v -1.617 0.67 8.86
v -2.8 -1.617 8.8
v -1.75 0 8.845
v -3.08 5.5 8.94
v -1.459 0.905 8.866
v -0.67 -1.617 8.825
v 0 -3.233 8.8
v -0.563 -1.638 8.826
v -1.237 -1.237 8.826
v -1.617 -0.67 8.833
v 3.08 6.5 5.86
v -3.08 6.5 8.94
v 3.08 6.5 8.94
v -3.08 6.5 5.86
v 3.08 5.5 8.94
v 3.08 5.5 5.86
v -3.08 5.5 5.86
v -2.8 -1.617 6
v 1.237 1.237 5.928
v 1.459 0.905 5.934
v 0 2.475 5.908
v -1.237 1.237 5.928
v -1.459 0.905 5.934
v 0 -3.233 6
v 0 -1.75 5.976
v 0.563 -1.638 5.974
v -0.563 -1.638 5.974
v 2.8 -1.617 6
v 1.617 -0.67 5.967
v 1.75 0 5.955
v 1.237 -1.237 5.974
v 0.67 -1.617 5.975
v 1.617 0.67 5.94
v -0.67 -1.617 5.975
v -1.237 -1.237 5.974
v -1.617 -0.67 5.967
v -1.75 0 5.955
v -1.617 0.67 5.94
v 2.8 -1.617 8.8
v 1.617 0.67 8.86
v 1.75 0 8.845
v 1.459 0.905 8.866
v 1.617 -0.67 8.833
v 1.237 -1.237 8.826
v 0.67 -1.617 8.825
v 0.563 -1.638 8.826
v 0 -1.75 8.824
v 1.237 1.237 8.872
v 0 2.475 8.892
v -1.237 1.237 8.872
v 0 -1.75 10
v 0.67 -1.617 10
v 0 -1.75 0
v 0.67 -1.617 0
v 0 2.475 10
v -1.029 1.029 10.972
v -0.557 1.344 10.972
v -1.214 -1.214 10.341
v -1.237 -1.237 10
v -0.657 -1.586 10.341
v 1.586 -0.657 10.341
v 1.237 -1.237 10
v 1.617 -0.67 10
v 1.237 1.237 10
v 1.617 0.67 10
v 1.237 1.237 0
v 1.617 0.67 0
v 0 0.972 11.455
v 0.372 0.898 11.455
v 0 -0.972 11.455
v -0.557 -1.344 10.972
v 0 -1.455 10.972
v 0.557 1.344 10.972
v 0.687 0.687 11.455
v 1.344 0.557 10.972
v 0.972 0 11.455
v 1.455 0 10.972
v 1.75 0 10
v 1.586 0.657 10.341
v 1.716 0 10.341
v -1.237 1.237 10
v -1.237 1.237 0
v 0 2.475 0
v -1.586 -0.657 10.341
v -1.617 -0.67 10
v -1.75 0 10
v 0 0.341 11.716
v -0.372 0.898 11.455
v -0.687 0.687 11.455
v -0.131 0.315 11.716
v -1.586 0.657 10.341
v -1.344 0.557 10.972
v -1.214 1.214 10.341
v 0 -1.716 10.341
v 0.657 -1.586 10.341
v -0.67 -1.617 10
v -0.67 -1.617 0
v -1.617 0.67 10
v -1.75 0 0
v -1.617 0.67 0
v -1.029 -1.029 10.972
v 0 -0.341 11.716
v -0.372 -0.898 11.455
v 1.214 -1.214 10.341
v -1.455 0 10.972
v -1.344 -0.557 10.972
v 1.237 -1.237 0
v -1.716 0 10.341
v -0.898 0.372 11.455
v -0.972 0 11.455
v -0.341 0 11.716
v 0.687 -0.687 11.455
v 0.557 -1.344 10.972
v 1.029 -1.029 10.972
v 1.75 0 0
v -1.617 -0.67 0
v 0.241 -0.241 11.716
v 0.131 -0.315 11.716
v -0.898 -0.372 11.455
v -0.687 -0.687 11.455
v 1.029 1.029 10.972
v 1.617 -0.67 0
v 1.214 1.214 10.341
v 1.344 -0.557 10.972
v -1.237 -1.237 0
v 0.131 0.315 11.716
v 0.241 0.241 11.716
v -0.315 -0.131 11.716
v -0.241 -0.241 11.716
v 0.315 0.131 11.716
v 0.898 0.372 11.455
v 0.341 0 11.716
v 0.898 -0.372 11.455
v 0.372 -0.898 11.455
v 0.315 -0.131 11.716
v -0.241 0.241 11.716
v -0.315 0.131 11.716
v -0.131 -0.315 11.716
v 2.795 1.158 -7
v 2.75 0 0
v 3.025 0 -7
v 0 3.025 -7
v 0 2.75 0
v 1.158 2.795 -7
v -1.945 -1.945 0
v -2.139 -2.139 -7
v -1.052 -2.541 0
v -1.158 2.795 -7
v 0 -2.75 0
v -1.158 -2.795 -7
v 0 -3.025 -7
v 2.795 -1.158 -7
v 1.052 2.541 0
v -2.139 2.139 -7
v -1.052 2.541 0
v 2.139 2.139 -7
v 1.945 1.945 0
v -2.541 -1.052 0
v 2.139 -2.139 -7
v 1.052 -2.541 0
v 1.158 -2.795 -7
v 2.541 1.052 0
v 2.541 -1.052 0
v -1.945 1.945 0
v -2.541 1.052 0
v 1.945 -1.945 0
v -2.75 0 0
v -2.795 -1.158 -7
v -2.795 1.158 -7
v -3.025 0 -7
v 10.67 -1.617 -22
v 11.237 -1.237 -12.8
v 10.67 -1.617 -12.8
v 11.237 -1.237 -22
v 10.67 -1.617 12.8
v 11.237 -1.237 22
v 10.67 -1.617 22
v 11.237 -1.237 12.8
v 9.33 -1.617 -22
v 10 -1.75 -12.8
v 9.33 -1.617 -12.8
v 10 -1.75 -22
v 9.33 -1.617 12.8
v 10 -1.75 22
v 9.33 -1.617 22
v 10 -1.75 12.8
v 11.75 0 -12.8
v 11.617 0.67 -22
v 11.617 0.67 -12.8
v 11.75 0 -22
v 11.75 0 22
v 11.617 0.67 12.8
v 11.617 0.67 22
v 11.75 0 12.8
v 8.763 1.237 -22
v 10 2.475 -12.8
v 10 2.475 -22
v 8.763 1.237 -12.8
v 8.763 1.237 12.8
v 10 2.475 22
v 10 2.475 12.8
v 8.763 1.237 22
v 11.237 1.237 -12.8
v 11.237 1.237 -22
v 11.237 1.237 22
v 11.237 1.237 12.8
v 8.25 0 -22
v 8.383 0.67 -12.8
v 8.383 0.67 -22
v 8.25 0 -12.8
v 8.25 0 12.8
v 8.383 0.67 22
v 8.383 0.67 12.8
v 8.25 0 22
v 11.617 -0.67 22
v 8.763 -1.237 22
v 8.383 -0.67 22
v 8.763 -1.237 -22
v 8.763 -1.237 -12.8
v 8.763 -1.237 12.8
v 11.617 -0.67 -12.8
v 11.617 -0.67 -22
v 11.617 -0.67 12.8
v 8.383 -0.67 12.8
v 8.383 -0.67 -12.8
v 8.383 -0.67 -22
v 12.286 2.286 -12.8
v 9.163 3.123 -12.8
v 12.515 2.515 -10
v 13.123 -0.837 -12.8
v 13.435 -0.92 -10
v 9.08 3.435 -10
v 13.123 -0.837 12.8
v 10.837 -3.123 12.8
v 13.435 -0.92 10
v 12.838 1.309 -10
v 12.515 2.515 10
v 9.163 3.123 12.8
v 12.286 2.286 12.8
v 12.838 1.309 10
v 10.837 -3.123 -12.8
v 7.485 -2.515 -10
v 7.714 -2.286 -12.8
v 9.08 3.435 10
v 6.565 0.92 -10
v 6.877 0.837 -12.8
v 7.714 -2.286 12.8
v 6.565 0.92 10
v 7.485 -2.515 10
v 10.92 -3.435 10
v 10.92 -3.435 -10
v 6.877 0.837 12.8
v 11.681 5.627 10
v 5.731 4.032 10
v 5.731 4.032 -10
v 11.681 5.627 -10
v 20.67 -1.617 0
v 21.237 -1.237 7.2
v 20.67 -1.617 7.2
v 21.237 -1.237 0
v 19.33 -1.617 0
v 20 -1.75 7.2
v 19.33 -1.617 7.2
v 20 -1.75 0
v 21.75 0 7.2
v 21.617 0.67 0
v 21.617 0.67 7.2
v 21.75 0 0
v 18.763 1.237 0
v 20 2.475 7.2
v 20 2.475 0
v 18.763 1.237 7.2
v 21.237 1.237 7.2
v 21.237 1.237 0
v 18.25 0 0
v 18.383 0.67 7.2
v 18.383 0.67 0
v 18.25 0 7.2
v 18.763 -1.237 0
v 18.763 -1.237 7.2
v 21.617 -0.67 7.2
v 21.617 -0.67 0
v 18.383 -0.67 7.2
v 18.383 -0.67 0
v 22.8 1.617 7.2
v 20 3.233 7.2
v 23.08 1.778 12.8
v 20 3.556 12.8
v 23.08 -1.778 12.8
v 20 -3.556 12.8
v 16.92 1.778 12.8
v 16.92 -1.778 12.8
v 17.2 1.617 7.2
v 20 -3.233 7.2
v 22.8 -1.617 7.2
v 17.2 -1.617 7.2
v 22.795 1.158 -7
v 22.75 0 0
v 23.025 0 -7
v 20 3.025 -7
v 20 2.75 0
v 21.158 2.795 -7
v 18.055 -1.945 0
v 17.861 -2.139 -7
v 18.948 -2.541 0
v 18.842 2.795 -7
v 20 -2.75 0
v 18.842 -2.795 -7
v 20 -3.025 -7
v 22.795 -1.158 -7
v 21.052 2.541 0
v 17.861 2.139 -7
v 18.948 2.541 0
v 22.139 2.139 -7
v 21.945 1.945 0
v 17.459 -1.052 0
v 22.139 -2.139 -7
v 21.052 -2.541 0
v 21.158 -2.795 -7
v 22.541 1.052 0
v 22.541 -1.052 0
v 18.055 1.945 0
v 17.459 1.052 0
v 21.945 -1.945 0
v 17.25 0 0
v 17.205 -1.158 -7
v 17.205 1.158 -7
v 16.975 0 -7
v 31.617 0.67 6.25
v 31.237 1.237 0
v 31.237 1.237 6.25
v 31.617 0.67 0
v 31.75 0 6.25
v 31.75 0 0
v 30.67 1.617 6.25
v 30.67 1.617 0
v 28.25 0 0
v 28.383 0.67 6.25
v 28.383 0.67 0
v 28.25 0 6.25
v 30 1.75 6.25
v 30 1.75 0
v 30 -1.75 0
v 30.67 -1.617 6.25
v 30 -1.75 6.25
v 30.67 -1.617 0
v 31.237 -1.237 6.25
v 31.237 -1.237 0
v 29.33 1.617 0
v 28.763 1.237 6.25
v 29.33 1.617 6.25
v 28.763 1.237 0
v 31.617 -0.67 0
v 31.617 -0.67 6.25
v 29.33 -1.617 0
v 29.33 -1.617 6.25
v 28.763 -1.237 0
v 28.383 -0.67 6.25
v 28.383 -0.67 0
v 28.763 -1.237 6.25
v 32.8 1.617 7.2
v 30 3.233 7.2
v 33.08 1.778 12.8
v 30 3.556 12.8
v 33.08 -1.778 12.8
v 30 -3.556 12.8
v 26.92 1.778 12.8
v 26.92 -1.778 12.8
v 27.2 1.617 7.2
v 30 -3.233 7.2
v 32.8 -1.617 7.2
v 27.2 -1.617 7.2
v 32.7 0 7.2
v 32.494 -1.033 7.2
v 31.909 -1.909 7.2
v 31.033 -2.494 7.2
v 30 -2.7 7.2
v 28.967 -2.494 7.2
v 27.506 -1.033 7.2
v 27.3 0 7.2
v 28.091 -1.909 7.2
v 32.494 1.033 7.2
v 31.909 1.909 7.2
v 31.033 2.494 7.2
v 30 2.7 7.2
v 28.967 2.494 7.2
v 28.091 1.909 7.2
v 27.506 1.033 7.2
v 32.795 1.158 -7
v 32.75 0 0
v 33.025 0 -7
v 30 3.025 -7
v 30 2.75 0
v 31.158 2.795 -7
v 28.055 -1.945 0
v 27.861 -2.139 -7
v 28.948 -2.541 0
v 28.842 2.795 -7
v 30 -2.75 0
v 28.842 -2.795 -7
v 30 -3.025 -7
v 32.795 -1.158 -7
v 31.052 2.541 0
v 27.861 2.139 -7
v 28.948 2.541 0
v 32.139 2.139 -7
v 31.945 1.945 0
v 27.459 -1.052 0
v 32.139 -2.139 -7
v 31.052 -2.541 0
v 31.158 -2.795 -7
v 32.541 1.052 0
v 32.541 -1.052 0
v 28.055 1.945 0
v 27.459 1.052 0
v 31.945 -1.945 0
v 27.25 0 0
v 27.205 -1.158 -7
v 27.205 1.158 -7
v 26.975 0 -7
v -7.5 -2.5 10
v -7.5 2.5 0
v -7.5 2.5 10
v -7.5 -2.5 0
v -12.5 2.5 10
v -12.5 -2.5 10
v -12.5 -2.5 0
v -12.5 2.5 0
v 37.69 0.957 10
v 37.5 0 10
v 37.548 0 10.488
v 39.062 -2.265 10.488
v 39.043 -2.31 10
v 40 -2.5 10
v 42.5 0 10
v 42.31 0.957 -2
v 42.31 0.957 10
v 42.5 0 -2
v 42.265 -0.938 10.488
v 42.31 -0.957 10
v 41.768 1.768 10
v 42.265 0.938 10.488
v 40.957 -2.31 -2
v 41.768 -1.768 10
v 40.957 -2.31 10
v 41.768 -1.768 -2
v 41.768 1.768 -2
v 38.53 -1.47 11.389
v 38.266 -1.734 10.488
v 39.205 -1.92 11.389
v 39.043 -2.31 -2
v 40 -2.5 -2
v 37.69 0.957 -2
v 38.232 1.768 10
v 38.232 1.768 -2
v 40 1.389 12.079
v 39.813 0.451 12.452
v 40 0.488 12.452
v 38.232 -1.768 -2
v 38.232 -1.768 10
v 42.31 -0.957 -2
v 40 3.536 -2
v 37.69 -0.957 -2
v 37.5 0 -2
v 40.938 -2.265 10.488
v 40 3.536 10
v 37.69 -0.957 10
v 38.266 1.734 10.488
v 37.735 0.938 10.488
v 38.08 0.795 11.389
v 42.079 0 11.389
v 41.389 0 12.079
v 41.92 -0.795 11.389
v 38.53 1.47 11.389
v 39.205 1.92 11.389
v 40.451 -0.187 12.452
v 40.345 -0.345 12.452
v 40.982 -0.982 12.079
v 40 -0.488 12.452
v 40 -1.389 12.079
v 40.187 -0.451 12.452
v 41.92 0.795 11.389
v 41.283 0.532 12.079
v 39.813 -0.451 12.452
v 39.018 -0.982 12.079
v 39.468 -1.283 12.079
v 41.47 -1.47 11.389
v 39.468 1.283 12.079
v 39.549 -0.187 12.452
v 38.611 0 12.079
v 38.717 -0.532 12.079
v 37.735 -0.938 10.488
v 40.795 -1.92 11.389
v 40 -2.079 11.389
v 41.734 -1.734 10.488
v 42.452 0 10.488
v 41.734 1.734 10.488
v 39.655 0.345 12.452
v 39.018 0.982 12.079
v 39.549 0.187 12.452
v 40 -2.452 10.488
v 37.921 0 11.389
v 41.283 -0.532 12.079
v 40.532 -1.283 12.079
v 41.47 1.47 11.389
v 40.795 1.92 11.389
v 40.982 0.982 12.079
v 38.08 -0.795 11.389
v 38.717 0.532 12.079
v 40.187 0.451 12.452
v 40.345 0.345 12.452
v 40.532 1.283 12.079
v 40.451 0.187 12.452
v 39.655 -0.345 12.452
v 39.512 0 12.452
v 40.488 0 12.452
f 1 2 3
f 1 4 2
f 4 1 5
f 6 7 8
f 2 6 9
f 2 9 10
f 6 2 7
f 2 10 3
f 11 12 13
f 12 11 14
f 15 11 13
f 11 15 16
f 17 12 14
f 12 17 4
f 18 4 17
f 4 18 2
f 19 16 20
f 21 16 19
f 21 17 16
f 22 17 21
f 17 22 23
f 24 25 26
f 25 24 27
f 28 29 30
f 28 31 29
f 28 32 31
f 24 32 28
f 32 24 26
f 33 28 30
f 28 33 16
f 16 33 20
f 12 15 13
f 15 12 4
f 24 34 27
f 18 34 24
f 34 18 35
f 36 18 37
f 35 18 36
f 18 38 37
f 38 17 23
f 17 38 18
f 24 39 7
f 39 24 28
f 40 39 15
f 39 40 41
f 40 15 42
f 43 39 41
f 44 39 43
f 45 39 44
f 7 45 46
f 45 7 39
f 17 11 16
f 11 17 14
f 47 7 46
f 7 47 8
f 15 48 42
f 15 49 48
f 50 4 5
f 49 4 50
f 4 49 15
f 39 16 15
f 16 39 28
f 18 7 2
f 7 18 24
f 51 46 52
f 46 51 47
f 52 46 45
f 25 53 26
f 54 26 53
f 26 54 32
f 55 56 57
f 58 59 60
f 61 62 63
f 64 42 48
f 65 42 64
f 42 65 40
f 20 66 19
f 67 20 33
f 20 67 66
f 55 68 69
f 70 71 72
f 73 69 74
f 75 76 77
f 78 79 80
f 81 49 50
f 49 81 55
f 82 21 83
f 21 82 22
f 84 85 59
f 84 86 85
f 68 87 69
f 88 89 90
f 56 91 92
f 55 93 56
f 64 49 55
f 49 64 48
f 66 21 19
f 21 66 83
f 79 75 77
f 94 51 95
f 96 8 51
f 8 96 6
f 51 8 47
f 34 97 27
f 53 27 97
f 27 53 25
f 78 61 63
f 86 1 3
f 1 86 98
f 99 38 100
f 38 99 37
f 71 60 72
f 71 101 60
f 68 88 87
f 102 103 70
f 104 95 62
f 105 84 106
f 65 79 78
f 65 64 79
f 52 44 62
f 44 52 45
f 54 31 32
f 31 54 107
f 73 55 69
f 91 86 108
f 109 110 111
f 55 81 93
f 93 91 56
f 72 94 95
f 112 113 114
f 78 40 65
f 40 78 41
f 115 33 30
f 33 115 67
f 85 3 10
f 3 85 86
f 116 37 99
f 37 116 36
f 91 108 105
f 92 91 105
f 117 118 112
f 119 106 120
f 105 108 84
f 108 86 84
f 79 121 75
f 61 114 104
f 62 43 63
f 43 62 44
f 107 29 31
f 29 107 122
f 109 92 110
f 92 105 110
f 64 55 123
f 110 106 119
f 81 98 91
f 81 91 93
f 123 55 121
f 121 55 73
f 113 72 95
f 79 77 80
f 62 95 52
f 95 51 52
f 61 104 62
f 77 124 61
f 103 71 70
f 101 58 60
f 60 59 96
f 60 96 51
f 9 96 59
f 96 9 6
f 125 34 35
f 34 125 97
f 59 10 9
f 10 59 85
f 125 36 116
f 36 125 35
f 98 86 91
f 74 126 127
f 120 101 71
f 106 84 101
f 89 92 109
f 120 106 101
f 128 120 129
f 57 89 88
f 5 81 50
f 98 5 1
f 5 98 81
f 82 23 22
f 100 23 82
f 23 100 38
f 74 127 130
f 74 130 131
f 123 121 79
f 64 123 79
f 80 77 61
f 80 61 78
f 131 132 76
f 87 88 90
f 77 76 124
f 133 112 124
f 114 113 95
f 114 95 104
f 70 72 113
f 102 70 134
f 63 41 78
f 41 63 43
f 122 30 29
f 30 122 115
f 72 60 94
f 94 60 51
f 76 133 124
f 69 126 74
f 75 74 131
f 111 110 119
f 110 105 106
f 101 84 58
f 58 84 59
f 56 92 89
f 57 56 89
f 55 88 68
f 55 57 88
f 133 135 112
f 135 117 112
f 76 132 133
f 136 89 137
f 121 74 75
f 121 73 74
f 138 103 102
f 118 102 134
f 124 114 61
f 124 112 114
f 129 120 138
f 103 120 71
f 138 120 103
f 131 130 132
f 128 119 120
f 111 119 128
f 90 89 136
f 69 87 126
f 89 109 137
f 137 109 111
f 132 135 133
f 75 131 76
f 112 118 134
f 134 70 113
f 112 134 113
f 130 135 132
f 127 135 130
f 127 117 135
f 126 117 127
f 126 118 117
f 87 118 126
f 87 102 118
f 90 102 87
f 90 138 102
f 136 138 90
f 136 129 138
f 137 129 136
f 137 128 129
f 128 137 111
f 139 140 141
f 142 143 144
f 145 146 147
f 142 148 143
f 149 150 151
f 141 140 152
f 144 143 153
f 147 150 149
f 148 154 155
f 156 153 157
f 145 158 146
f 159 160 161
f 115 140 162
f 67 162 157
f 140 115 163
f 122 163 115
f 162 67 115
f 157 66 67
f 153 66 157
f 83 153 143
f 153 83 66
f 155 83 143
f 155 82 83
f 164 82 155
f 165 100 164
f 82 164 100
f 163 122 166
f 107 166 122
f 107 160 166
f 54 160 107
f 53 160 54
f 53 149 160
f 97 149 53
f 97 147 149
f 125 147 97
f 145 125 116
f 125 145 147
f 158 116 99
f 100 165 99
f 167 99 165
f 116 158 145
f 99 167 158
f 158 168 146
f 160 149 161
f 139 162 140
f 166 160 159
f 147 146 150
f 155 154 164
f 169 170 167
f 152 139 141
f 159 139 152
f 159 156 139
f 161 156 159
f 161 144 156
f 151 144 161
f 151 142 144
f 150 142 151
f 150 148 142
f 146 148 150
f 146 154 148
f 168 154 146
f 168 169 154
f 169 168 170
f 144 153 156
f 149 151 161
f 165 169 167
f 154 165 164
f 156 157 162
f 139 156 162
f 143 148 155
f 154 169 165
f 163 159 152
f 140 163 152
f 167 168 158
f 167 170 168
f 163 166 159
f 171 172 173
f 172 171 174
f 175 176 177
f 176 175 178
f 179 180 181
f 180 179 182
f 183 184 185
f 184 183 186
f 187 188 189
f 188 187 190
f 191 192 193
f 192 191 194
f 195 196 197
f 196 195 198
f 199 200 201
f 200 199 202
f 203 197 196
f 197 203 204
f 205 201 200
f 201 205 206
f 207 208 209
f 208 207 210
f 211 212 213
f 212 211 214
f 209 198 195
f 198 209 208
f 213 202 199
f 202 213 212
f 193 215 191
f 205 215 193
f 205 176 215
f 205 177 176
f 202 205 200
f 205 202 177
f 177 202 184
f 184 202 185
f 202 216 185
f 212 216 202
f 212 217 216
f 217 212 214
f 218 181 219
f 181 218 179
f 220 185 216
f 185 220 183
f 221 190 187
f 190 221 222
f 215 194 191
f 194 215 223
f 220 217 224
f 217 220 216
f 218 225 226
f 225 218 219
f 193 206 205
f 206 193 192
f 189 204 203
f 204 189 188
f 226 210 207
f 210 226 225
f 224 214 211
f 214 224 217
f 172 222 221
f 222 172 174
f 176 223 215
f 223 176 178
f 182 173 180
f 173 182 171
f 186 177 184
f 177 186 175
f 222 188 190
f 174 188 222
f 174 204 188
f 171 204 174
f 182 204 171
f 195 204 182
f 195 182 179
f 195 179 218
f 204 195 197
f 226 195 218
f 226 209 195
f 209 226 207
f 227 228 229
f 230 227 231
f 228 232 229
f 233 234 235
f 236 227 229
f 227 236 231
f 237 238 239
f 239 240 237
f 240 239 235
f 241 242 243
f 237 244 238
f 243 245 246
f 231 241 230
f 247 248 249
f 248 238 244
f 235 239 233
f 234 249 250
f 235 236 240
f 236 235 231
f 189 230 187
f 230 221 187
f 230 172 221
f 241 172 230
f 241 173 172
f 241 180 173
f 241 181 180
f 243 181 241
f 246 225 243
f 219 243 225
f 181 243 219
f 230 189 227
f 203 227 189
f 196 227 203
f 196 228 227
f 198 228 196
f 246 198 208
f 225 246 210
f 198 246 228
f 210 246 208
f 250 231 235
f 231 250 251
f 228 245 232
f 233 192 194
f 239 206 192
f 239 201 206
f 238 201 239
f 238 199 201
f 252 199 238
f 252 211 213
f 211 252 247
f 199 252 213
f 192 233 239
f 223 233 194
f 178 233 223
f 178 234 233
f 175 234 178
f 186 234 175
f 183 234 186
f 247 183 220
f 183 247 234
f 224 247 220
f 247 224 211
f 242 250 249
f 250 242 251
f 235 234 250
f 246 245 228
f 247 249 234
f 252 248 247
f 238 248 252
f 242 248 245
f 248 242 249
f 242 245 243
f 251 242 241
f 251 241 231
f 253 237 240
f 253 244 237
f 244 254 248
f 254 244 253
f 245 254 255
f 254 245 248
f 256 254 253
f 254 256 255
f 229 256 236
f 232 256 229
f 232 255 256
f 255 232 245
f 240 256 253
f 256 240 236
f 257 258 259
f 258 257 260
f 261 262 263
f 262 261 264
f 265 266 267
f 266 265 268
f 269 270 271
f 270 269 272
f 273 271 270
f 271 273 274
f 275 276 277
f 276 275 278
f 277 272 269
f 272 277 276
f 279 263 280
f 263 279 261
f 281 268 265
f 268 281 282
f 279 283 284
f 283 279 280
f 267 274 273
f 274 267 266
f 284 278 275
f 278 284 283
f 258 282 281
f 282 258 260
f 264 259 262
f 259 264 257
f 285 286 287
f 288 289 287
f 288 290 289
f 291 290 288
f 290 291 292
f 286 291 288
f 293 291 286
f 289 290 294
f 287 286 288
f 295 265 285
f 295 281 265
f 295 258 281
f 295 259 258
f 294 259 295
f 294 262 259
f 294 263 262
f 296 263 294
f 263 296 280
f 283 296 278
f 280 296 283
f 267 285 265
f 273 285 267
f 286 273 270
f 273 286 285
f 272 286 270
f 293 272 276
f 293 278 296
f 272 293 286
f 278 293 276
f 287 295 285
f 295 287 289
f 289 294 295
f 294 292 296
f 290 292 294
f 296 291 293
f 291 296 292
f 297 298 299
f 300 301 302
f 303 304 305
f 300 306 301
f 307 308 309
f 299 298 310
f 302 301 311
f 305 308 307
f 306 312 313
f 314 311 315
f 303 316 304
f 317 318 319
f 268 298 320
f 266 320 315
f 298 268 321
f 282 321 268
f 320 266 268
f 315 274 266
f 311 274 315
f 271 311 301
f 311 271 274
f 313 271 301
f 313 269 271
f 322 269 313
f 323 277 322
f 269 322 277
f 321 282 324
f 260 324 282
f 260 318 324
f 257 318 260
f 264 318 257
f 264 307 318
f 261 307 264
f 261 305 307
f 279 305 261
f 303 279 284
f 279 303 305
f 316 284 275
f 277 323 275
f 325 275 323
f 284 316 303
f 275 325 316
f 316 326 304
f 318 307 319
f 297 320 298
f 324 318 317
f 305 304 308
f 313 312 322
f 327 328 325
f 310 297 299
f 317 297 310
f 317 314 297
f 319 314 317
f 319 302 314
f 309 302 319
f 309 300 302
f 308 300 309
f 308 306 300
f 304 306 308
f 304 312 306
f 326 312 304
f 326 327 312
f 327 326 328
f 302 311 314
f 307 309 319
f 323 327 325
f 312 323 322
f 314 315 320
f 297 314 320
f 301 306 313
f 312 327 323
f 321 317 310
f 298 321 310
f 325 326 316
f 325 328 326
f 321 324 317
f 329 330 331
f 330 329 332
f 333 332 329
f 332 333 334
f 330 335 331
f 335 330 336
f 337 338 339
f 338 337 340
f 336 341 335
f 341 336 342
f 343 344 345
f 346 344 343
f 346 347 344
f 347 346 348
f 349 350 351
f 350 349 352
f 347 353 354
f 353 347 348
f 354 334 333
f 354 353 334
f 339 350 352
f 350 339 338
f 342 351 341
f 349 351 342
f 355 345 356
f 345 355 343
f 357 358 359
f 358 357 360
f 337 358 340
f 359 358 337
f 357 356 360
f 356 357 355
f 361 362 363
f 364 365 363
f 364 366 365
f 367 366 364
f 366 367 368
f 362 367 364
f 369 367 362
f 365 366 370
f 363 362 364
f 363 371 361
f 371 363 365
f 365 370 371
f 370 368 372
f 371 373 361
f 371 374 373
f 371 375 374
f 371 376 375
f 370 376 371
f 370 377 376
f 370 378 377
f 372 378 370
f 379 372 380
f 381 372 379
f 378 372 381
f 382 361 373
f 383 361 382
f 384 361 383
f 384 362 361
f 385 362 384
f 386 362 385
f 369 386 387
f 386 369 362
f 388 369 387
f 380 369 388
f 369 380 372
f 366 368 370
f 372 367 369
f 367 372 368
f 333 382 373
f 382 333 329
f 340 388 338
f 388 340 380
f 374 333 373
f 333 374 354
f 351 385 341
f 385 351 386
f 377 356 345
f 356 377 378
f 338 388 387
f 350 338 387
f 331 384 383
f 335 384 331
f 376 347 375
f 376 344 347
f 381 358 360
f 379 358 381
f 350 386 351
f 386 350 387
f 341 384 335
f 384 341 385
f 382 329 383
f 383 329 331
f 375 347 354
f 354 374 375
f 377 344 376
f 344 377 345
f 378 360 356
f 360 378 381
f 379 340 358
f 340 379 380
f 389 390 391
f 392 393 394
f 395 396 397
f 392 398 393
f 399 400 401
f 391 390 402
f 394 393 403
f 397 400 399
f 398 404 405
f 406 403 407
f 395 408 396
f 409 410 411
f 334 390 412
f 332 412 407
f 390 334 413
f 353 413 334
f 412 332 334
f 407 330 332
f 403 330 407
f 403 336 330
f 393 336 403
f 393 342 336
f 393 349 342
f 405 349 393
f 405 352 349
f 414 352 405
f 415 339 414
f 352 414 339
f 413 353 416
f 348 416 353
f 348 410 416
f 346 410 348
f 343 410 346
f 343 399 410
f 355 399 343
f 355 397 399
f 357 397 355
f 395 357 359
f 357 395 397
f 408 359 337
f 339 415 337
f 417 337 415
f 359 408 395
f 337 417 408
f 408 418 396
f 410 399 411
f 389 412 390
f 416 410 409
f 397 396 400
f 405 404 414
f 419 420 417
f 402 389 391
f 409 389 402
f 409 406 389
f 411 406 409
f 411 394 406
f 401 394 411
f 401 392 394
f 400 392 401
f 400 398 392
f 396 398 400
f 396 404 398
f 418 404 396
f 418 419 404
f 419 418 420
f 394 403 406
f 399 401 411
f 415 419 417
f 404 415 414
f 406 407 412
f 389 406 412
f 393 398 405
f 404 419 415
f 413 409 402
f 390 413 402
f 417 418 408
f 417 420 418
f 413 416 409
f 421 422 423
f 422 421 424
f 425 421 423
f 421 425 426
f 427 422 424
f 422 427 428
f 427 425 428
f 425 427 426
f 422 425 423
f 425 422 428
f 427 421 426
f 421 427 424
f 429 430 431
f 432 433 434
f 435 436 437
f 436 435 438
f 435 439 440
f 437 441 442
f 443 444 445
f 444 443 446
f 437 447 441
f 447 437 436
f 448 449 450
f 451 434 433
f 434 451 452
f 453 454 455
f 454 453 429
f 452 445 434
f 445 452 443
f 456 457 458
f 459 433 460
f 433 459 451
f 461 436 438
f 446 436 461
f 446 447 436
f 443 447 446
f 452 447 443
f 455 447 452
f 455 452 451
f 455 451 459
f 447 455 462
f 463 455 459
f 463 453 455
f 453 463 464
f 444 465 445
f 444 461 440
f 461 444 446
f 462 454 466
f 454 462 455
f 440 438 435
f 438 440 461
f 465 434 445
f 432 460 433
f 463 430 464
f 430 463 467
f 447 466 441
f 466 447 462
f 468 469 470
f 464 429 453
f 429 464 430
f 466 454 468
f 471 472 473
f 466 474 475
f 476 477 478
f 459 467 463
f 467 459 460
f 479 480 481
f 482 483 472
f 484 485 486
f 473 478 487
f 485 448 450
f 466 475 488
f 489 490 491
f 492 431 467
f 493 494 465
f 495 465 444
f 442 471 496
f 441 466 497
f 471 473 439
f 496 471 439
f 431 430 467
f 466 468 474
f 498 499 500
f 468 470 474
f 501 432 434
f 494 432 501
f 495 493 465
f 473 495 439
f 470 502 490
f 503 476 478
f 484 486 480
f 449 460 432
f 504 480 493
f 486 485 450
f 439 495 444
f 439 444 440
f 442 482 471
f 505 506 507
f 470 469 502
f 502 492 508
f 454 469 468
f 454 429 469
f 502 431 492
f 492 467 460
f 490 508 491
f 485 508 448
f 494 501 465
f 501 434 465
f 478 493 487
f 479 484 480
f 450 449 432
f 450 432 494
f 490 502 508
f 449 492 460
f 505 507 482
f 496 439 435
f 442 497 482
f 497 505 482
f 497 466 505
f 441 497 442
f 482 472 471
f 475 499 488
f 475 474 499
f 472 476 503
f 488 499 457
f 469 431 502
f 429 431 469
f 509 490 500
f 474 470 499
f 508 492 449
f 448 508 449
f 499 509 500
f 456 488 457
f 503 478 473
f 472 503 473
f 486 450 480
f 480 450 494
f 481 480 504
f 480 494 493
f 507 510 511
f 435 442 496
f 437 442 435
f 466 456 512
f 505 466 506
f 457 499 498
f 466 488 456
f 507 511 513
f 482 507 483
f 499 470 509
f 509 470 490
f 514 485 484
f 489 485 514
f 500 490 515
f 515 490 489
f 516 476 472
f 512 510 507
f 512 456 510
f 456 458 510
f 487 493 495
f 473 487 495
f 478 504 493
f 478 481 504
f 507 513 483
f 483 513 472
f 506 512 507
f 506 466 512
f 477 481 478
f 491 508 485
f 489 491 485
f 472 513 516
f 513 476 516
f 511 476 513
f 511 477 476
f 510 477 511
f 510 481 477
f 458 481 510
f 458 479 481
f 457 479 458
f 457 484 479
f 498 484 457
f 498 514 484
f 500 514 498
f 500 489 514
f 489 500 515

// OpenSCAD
//User Defined Features

//"THE BEER-WARE LICENSE" (Revision 42):
//<https://github.com/njprossi> wrote this file. As long as you retain this notice you
//can do whatever you want with this stuff. If we meet some day, and you think
//this stuff is worth it, you can buy me a beer in return.
//Nicolas Rossi

//Currently only for M3

nh=2.8;		//Nut height
ns=5.6;		//Nut 
sd=3.5;		//Screw main dia
shd=5.5;		//Screw head dia
shh=3.5;		//Screw head height

dr=1.1;		//Draft %

$fn=16;

module nut_well(length,position,height,angle,counterbore=false) {
	union() {
		translate([0,0,position+nh/2]) rotate([0,90,90+angle]) hull() {
			rotate([0,90,0]) cylinder(h=nh,r=ns/(sqrt(3)),center=true,$fn=6);
			translate([0,0,height+1]) cube([nh*dr,ns*dr,1],true);
		}
		reprap_hole(sd,length,true);
	}
	if (counterbore==true) counterbore(shh,shd);
}

module nut_well_2(length,distance,height,angle,counterbore=false) {
	union() {
		translate([0,0,-distance/2])reprap_hole(sd,distance+2,false);
		rotate([0,0,angle]) hull() for(a=[0,180]) rotate([0,a,0]) translate([0,0,-distance/2+length-nh]) rotate([0,0,90]) cylinder(h=nh,r1=ns/(sqrt(3)),r2=ns*dr/(sqrt(3)),center=false,$fn=6);
		rotate([0,0,angle]) translate([0,height/2,0]) cube([ns*dr,height,distance-2*length],true);
	}
	if (counterbore==true) counterbore(shh,shd);
}

module nut_cutout(length,angle,counterbore=false){
	reprap_hole(sd,length-1,false);
	translate([0,0,length]) rotate([0,0,90+angle]) cylinder(h=nh*2,r1=ns/(sqrt(3)),r2=ns*dr/(sqrt(3)),center=true,$fn=6);
	if (counterbore==true) counterbore(shh,shd);
}
module nut_cutout_2(length,angle,counterbore=false,overhang=false){
	translate([0,0,length/2-1]) cylinder(h=length+2, r=sd/2, center=true);
	translate([0,0,length]) rotate([0,0,90+angle]) cylinder(h=nh*2, r2=ns*dr/sqrt(3), r1=ns/sqrt(3), center = true,$fn=6);
	if (overhang==true) translate([0,0,length-nh-ns/4+.1]) cylinder(h=ns/2, r2=ns/2, r1=0, center = true);
	if (counterbore==true) counterbore(shh,shd);
}

module counterbore(h,d){
	translate([0,0,-h]) cylinder(h=h*2,r1=(d*dr)/2,r2=d/2,center=true,$fn=16);
}

module reprap_hole(diameter,length,sphere=false) {
		translate([0,0,length/2-1]) hull(){
			cylinder(h=length+2,r=diameter/2,center=true,$fn=16);
			translate([0,0,-length/2-1]) rotate([90,0,135]) cube([diameter/2,length+2,diameter/2],false);
			if (sphere==true) translate([0,0,length/2+1]) sphere(r=diameter/2,$fn=16);
		}
}

/* Test
difference() {
	translate([10,0,0])cube([20,10,10],true);
	nut_well(12,5,5,0);
	nut_cutout(12);
}
*/


translate([-10,0,5]) cube([5,5,10],true);
nut_well(10,6,5,0,true);
translate([10,0,0]) nut_well_2(10,40,5,15,false);
translate([20,0,0]) nut_cutout(10,0,true);
translate([30,0,0]) nut_cutout_2(10,0,true,true);
translate([40,0,0]) reprap_hole(5,10,true);
